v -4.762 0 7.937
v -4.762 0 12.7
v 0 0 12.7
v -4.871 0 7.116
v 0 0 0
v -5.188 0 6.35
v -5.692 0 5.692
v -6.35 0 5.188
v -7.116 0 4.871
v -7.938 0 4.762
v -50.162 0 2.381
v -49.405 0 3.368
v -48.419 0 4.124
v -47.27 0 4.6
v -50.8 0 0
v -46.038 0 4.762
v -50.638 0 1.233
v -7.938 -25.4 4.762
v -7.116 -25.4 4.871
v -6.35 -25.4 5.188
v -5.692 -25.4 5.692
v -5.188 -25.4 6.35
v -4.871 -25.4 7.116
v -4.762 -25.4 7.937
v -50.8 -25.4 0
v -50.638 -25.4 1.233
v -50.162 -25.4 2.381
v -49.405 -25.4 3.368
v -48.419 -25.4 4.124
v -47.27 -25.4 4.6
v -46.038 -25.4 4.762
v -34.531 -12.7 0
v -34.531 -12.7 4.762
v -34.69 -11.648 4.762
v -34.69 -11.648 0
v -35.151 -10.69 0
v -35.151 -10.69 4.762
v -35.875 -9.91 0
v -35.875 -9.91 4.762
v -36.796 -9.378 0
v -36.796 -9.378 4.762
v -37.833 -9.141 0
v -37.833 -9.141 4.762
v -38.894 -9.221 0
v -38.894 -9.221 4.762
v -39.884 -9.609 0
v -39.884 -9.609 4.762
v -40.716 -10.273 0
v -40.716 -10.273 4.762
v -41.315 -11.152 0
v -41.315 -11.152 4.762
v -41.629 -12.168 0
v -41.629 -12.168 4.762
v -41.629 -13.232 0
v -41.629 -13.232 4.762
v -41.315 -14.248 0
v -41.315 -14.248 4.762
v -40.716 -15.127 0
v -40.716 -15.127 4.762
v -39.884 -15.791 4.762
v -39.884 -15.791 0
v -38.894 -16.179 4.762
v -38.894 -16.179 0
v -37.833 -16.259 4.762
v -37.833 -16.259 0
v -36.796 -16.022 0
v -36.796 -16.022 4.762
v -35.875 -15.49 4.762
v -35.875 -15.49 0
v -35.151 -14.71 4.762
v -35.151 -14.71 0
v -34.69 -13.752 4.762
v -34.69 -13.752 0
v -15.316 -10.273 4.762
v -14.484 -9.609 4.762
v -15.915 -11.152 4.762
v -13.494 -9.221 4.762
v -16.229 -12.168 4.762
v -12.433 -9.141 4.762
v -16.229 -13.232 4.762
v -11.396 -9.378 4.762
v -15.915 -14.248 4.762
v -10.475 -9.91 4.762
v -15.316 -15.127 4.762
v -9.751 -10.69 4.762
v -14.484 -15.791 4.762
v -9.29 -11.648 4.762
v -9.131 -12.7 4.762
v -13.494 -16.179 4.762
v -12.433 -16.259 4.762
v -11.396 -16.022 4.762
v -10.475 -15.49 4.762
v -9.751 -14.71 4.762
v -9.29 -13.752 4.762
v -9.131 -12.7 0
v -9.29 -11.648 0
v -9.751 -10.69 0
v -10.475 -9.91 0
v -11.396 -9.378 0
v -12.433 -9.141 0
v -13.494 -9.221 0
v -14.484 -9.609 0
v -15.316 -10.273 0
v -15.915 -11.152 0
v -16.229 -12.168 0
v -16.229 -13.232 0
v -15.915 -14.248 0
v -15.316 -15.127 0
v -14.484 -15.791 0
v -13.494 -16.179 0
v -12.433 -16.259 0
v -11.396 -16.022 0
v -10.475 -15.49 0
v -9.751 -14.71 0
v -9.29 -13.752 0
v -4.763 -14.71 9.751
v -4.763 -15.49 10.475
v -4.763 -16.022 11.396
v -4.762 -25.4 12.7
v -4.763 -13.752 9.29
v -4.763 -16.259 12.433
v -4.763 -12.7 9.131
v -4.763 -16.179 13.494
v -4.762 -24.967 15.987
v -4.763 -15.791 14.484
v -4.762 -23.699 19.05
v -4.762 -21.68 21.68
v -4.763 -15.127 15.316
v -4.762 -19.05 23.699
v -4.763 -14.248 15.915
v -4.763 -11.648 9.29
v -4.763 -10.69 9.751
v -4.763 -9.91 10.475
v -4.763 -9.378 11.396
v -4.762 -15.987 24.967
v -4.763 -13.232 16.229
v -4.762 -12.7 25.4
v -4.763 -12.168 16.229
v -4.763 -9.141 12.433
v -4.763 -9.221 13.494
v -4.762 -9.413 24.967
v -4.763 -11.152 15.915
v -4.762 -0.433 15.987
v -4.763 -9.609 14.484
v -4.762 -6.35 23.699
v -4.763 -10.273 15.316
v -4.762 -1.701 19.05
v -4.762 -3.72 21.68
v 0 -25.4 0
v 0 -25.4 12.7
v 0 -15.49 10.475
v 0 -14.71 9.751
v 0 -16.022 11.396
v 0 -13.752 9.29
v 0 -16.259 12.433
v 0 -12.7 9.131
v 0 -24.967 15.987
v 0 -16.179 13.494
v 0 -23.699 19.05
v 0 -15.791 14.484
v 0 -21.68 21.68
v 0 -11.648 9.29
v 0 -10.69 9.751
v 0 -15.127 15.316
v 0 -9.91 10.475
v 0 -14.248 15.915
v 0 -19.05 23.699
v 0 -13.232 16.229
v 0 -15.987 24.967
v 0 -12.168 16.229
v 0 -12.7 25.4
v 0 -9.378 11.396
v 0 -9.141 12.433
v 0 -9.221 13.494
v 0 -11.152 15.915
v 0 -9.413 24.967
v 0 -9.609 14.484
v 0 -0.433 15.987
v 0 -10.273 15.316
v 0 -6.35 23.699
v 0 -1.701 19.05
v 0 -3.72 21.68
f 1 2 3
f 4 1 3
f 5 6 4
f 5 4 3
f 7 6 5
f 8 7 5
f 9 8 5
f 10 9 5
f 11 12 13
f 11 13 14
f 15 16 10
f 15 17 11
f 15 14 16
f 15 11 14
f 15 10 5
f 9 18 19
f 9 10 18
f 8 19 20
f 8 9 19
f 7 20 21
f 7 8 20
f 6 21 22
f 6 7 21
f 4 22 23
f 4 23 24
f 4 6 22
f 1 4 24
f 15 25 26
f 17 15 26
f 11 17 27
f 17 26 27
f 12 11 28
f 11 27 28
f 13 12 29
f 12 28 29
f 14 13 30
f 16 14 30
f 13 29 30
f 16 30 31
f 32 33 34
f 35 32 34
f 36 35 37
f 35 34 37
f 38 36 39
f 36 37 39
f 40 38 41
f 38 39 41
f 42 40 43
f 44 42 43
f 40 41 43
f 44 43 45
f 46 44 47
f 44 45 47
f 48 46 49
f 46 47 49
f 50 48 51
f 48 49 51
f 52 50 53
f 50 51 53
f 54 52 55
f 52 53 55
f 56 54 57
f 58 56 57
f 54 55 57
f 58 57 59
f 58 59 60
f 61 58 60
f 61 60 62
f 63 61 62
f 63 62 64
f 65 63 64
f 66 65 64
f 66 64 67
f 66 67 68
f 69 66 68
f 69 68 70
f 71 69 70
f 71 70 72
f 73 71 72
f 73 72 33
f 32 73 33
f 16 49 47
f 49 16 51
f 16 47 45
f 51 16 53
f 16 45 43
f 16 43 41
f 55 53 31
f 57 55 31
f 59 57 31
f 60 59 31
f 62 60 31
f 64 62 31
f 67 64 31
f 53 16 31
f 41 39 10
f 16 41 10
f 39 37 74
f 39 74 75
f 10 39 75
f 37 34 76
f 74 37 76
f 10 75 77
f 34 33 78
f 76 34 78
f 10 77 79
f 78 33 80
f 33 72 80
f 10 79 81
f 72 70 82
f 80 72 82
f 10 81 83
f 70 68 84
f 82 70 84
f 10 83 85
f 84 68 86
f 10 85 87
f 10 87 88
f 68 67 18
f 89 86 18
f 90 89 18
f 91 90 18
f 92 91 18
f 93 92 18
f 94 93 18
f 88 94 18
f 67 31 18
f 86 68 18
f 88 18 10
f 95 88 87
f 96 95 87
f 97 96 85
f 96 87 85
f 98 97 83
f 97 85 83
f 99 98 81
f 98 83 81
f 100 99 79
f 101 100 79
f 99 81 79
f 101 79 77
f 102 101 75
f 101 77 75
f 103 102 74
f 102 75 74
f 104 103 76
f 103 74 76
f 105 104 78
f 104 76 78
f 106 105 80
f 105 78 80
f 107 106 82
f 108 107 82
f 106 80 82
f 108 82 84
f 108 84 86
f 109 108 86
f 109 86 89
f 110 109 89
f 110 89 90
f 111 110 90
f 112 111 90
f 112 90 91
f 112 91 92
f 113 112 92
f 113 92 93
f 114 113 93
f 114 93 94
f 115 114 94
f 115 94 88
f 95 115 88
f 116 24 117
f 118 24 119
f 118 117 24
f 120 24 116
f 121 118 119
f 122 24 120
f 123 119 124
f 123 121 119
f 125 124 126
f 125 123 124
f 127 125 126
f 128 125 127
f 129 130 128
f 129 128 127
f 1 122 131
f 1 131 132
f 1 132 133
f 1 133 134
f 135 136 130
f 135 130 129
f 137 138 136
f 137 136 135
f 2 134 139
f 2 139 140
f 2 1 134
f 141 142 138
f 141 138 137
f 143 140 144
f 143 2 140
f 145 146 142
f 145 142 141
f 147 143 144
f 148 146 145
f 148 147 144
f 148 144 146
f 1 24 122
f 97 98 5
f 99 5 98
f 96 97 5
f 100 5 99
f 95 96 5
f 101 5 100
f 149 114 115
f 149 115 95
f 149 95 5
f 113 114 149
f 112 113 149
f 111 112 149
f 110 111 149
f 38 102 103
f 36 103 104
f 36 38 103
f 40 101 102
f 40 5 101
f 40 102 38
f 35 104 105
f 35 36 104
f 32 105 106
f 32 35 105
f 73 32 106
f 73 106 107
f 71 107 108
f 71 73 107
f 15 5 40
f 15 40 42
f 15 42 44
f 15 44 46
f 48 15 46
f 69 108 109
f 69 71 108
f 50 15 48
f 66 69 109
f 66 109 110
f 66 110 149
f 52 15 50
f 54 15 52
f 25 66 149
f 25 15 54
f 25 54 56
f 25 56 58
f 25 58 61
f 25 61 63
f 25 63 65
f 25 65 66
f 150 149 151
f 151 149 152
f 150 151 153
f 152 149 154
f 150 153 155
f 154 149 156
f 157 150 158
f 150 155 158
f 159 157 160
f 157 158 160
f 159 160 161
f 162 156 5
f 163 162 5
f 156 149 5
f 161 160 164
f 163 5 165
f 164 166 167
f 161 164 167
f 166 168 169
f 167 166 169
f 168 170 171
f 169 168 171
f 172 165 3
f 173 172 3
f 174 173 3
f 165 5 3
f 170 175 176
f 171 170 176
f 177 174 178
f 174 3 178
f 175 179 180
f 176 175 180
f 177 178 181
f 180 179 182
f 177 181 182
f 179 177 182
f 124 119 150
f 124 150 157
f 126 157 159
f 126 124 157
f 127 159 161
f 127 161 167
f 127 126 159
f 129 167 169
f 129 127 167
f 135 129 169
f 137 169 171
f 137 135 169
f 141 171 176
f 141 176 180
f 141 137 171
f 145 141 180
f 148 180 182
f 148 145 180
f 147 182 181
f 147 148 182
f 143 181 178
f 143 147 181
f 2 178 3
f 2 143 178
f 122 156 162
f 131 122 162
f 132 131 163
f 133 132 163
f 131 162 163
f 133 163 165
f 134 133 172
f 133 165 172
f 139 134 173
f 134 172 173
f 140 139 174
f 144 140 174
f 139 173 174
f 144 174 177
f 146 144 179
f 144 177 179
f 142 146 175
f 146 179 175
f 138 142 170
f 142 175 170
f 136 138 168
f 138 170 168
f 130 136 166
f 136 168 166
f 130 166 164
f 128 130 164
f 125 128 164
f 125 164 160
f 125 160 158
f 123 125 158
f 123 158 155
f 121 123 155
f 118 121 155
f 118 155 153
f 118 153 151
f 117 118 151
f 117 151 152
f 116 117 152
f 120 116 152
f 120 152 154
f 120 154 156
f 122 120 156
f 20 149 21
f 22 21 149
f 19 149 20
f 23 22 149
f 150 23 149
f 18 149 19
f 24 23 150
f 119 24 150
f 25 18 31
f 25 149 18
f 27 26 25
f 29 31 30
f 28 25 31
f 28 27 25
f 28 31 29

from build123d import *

# Parameters (mm, degrees)
BOSS_EXTRUDE1_START        = -25.4
BOSS_EXTRUDE1_DEPTH        = 25.4
BOSS_EXTRUDE2_DEPTH        = 4.7625
M6_5_CLEARANCE_HOLE1_D     = 7.1374
M6_5_CLEARANCE_HOLE1_DEPTH = 25.4
M6_5_CLEARANCE_HOLE2_D     = 7.1374
FILLET1_R                  = 3.175


with BuildPart() as part:
    # Boss-Extrude1: read off the stored shape, not the designer's step
    # Boss-Extrude1 outline → Boss-Extrude1 (new body)
    with BuildSketch(Plane(origin=(0, 0, 0), x_dir=(1, 0, 0), z_dir=(0, 1, 0)).offset(BOSS_EXTRUDE1_START)):
        with BuildLine():
            Line((-4.7625, -4.7625), (-4.7625, 0))
            Line((-4.7625, 0), (-50.8, 0))
            ThreePointArc((-50.8, 0), (-49.405096045, -3.367596045), (-46.0375, -4.7625))
            Line((-46.0375, -4.7625), (-4.7625, -4.7625))
        make_face()
    extrude(amount=BOSS_EXTRUDE1_DEPTH)

    # Sketch2 → Boss-Extrude2 (add)
    with BuildSketch(Plane(origin=(-4.7625, 0, 0), x_dir=(0, 0, -1), z_dir=(1, 0, 0))):
        with BuildLine():
            Line((0, 0), (0, -25.4))
            Line((0, -25.4), (-12.7, -25.4))
            ThreePointArc((-12.7, -25.4), (-25.4, -12.7), (-12.7, 0))
            Line((-12.7, 0), (0, 0))
        make_face()
    extrude(amount=BOSS_EXTRUDE2_DEPTH)

    # M6.5 Clearance Hole1
    with Locations(Plane(origin=(0, 0, 0), x_dir=(-1, 0, 0), z_dir=(0, 0, -1))):
        with Locations((38.1, -12.7), (12.7, -12.7)):
            Hole(M6_5_CLEARANCE_HOLE1_D / 2, depth=M6_5_CLEARANCE_HOLE1_DEPTH)

    # M6.5 Clearance Hole2 (through all)
    with Locations(Plane.ZY.offset(4.7625)):
        with Locations((12.7, -12.7)):
            Hole(M6_5_CLEARANCE_HOLE2_D / 2)

    # Fillet1
    fillet1_edges = [part.edges().sort_by_distance(p)[0] for p in [
        (-4.7625, -12.7, 4.7625),
    ]]
    fillet(fillet1_edges, radius=FILLET1_R)


solid = part.part
